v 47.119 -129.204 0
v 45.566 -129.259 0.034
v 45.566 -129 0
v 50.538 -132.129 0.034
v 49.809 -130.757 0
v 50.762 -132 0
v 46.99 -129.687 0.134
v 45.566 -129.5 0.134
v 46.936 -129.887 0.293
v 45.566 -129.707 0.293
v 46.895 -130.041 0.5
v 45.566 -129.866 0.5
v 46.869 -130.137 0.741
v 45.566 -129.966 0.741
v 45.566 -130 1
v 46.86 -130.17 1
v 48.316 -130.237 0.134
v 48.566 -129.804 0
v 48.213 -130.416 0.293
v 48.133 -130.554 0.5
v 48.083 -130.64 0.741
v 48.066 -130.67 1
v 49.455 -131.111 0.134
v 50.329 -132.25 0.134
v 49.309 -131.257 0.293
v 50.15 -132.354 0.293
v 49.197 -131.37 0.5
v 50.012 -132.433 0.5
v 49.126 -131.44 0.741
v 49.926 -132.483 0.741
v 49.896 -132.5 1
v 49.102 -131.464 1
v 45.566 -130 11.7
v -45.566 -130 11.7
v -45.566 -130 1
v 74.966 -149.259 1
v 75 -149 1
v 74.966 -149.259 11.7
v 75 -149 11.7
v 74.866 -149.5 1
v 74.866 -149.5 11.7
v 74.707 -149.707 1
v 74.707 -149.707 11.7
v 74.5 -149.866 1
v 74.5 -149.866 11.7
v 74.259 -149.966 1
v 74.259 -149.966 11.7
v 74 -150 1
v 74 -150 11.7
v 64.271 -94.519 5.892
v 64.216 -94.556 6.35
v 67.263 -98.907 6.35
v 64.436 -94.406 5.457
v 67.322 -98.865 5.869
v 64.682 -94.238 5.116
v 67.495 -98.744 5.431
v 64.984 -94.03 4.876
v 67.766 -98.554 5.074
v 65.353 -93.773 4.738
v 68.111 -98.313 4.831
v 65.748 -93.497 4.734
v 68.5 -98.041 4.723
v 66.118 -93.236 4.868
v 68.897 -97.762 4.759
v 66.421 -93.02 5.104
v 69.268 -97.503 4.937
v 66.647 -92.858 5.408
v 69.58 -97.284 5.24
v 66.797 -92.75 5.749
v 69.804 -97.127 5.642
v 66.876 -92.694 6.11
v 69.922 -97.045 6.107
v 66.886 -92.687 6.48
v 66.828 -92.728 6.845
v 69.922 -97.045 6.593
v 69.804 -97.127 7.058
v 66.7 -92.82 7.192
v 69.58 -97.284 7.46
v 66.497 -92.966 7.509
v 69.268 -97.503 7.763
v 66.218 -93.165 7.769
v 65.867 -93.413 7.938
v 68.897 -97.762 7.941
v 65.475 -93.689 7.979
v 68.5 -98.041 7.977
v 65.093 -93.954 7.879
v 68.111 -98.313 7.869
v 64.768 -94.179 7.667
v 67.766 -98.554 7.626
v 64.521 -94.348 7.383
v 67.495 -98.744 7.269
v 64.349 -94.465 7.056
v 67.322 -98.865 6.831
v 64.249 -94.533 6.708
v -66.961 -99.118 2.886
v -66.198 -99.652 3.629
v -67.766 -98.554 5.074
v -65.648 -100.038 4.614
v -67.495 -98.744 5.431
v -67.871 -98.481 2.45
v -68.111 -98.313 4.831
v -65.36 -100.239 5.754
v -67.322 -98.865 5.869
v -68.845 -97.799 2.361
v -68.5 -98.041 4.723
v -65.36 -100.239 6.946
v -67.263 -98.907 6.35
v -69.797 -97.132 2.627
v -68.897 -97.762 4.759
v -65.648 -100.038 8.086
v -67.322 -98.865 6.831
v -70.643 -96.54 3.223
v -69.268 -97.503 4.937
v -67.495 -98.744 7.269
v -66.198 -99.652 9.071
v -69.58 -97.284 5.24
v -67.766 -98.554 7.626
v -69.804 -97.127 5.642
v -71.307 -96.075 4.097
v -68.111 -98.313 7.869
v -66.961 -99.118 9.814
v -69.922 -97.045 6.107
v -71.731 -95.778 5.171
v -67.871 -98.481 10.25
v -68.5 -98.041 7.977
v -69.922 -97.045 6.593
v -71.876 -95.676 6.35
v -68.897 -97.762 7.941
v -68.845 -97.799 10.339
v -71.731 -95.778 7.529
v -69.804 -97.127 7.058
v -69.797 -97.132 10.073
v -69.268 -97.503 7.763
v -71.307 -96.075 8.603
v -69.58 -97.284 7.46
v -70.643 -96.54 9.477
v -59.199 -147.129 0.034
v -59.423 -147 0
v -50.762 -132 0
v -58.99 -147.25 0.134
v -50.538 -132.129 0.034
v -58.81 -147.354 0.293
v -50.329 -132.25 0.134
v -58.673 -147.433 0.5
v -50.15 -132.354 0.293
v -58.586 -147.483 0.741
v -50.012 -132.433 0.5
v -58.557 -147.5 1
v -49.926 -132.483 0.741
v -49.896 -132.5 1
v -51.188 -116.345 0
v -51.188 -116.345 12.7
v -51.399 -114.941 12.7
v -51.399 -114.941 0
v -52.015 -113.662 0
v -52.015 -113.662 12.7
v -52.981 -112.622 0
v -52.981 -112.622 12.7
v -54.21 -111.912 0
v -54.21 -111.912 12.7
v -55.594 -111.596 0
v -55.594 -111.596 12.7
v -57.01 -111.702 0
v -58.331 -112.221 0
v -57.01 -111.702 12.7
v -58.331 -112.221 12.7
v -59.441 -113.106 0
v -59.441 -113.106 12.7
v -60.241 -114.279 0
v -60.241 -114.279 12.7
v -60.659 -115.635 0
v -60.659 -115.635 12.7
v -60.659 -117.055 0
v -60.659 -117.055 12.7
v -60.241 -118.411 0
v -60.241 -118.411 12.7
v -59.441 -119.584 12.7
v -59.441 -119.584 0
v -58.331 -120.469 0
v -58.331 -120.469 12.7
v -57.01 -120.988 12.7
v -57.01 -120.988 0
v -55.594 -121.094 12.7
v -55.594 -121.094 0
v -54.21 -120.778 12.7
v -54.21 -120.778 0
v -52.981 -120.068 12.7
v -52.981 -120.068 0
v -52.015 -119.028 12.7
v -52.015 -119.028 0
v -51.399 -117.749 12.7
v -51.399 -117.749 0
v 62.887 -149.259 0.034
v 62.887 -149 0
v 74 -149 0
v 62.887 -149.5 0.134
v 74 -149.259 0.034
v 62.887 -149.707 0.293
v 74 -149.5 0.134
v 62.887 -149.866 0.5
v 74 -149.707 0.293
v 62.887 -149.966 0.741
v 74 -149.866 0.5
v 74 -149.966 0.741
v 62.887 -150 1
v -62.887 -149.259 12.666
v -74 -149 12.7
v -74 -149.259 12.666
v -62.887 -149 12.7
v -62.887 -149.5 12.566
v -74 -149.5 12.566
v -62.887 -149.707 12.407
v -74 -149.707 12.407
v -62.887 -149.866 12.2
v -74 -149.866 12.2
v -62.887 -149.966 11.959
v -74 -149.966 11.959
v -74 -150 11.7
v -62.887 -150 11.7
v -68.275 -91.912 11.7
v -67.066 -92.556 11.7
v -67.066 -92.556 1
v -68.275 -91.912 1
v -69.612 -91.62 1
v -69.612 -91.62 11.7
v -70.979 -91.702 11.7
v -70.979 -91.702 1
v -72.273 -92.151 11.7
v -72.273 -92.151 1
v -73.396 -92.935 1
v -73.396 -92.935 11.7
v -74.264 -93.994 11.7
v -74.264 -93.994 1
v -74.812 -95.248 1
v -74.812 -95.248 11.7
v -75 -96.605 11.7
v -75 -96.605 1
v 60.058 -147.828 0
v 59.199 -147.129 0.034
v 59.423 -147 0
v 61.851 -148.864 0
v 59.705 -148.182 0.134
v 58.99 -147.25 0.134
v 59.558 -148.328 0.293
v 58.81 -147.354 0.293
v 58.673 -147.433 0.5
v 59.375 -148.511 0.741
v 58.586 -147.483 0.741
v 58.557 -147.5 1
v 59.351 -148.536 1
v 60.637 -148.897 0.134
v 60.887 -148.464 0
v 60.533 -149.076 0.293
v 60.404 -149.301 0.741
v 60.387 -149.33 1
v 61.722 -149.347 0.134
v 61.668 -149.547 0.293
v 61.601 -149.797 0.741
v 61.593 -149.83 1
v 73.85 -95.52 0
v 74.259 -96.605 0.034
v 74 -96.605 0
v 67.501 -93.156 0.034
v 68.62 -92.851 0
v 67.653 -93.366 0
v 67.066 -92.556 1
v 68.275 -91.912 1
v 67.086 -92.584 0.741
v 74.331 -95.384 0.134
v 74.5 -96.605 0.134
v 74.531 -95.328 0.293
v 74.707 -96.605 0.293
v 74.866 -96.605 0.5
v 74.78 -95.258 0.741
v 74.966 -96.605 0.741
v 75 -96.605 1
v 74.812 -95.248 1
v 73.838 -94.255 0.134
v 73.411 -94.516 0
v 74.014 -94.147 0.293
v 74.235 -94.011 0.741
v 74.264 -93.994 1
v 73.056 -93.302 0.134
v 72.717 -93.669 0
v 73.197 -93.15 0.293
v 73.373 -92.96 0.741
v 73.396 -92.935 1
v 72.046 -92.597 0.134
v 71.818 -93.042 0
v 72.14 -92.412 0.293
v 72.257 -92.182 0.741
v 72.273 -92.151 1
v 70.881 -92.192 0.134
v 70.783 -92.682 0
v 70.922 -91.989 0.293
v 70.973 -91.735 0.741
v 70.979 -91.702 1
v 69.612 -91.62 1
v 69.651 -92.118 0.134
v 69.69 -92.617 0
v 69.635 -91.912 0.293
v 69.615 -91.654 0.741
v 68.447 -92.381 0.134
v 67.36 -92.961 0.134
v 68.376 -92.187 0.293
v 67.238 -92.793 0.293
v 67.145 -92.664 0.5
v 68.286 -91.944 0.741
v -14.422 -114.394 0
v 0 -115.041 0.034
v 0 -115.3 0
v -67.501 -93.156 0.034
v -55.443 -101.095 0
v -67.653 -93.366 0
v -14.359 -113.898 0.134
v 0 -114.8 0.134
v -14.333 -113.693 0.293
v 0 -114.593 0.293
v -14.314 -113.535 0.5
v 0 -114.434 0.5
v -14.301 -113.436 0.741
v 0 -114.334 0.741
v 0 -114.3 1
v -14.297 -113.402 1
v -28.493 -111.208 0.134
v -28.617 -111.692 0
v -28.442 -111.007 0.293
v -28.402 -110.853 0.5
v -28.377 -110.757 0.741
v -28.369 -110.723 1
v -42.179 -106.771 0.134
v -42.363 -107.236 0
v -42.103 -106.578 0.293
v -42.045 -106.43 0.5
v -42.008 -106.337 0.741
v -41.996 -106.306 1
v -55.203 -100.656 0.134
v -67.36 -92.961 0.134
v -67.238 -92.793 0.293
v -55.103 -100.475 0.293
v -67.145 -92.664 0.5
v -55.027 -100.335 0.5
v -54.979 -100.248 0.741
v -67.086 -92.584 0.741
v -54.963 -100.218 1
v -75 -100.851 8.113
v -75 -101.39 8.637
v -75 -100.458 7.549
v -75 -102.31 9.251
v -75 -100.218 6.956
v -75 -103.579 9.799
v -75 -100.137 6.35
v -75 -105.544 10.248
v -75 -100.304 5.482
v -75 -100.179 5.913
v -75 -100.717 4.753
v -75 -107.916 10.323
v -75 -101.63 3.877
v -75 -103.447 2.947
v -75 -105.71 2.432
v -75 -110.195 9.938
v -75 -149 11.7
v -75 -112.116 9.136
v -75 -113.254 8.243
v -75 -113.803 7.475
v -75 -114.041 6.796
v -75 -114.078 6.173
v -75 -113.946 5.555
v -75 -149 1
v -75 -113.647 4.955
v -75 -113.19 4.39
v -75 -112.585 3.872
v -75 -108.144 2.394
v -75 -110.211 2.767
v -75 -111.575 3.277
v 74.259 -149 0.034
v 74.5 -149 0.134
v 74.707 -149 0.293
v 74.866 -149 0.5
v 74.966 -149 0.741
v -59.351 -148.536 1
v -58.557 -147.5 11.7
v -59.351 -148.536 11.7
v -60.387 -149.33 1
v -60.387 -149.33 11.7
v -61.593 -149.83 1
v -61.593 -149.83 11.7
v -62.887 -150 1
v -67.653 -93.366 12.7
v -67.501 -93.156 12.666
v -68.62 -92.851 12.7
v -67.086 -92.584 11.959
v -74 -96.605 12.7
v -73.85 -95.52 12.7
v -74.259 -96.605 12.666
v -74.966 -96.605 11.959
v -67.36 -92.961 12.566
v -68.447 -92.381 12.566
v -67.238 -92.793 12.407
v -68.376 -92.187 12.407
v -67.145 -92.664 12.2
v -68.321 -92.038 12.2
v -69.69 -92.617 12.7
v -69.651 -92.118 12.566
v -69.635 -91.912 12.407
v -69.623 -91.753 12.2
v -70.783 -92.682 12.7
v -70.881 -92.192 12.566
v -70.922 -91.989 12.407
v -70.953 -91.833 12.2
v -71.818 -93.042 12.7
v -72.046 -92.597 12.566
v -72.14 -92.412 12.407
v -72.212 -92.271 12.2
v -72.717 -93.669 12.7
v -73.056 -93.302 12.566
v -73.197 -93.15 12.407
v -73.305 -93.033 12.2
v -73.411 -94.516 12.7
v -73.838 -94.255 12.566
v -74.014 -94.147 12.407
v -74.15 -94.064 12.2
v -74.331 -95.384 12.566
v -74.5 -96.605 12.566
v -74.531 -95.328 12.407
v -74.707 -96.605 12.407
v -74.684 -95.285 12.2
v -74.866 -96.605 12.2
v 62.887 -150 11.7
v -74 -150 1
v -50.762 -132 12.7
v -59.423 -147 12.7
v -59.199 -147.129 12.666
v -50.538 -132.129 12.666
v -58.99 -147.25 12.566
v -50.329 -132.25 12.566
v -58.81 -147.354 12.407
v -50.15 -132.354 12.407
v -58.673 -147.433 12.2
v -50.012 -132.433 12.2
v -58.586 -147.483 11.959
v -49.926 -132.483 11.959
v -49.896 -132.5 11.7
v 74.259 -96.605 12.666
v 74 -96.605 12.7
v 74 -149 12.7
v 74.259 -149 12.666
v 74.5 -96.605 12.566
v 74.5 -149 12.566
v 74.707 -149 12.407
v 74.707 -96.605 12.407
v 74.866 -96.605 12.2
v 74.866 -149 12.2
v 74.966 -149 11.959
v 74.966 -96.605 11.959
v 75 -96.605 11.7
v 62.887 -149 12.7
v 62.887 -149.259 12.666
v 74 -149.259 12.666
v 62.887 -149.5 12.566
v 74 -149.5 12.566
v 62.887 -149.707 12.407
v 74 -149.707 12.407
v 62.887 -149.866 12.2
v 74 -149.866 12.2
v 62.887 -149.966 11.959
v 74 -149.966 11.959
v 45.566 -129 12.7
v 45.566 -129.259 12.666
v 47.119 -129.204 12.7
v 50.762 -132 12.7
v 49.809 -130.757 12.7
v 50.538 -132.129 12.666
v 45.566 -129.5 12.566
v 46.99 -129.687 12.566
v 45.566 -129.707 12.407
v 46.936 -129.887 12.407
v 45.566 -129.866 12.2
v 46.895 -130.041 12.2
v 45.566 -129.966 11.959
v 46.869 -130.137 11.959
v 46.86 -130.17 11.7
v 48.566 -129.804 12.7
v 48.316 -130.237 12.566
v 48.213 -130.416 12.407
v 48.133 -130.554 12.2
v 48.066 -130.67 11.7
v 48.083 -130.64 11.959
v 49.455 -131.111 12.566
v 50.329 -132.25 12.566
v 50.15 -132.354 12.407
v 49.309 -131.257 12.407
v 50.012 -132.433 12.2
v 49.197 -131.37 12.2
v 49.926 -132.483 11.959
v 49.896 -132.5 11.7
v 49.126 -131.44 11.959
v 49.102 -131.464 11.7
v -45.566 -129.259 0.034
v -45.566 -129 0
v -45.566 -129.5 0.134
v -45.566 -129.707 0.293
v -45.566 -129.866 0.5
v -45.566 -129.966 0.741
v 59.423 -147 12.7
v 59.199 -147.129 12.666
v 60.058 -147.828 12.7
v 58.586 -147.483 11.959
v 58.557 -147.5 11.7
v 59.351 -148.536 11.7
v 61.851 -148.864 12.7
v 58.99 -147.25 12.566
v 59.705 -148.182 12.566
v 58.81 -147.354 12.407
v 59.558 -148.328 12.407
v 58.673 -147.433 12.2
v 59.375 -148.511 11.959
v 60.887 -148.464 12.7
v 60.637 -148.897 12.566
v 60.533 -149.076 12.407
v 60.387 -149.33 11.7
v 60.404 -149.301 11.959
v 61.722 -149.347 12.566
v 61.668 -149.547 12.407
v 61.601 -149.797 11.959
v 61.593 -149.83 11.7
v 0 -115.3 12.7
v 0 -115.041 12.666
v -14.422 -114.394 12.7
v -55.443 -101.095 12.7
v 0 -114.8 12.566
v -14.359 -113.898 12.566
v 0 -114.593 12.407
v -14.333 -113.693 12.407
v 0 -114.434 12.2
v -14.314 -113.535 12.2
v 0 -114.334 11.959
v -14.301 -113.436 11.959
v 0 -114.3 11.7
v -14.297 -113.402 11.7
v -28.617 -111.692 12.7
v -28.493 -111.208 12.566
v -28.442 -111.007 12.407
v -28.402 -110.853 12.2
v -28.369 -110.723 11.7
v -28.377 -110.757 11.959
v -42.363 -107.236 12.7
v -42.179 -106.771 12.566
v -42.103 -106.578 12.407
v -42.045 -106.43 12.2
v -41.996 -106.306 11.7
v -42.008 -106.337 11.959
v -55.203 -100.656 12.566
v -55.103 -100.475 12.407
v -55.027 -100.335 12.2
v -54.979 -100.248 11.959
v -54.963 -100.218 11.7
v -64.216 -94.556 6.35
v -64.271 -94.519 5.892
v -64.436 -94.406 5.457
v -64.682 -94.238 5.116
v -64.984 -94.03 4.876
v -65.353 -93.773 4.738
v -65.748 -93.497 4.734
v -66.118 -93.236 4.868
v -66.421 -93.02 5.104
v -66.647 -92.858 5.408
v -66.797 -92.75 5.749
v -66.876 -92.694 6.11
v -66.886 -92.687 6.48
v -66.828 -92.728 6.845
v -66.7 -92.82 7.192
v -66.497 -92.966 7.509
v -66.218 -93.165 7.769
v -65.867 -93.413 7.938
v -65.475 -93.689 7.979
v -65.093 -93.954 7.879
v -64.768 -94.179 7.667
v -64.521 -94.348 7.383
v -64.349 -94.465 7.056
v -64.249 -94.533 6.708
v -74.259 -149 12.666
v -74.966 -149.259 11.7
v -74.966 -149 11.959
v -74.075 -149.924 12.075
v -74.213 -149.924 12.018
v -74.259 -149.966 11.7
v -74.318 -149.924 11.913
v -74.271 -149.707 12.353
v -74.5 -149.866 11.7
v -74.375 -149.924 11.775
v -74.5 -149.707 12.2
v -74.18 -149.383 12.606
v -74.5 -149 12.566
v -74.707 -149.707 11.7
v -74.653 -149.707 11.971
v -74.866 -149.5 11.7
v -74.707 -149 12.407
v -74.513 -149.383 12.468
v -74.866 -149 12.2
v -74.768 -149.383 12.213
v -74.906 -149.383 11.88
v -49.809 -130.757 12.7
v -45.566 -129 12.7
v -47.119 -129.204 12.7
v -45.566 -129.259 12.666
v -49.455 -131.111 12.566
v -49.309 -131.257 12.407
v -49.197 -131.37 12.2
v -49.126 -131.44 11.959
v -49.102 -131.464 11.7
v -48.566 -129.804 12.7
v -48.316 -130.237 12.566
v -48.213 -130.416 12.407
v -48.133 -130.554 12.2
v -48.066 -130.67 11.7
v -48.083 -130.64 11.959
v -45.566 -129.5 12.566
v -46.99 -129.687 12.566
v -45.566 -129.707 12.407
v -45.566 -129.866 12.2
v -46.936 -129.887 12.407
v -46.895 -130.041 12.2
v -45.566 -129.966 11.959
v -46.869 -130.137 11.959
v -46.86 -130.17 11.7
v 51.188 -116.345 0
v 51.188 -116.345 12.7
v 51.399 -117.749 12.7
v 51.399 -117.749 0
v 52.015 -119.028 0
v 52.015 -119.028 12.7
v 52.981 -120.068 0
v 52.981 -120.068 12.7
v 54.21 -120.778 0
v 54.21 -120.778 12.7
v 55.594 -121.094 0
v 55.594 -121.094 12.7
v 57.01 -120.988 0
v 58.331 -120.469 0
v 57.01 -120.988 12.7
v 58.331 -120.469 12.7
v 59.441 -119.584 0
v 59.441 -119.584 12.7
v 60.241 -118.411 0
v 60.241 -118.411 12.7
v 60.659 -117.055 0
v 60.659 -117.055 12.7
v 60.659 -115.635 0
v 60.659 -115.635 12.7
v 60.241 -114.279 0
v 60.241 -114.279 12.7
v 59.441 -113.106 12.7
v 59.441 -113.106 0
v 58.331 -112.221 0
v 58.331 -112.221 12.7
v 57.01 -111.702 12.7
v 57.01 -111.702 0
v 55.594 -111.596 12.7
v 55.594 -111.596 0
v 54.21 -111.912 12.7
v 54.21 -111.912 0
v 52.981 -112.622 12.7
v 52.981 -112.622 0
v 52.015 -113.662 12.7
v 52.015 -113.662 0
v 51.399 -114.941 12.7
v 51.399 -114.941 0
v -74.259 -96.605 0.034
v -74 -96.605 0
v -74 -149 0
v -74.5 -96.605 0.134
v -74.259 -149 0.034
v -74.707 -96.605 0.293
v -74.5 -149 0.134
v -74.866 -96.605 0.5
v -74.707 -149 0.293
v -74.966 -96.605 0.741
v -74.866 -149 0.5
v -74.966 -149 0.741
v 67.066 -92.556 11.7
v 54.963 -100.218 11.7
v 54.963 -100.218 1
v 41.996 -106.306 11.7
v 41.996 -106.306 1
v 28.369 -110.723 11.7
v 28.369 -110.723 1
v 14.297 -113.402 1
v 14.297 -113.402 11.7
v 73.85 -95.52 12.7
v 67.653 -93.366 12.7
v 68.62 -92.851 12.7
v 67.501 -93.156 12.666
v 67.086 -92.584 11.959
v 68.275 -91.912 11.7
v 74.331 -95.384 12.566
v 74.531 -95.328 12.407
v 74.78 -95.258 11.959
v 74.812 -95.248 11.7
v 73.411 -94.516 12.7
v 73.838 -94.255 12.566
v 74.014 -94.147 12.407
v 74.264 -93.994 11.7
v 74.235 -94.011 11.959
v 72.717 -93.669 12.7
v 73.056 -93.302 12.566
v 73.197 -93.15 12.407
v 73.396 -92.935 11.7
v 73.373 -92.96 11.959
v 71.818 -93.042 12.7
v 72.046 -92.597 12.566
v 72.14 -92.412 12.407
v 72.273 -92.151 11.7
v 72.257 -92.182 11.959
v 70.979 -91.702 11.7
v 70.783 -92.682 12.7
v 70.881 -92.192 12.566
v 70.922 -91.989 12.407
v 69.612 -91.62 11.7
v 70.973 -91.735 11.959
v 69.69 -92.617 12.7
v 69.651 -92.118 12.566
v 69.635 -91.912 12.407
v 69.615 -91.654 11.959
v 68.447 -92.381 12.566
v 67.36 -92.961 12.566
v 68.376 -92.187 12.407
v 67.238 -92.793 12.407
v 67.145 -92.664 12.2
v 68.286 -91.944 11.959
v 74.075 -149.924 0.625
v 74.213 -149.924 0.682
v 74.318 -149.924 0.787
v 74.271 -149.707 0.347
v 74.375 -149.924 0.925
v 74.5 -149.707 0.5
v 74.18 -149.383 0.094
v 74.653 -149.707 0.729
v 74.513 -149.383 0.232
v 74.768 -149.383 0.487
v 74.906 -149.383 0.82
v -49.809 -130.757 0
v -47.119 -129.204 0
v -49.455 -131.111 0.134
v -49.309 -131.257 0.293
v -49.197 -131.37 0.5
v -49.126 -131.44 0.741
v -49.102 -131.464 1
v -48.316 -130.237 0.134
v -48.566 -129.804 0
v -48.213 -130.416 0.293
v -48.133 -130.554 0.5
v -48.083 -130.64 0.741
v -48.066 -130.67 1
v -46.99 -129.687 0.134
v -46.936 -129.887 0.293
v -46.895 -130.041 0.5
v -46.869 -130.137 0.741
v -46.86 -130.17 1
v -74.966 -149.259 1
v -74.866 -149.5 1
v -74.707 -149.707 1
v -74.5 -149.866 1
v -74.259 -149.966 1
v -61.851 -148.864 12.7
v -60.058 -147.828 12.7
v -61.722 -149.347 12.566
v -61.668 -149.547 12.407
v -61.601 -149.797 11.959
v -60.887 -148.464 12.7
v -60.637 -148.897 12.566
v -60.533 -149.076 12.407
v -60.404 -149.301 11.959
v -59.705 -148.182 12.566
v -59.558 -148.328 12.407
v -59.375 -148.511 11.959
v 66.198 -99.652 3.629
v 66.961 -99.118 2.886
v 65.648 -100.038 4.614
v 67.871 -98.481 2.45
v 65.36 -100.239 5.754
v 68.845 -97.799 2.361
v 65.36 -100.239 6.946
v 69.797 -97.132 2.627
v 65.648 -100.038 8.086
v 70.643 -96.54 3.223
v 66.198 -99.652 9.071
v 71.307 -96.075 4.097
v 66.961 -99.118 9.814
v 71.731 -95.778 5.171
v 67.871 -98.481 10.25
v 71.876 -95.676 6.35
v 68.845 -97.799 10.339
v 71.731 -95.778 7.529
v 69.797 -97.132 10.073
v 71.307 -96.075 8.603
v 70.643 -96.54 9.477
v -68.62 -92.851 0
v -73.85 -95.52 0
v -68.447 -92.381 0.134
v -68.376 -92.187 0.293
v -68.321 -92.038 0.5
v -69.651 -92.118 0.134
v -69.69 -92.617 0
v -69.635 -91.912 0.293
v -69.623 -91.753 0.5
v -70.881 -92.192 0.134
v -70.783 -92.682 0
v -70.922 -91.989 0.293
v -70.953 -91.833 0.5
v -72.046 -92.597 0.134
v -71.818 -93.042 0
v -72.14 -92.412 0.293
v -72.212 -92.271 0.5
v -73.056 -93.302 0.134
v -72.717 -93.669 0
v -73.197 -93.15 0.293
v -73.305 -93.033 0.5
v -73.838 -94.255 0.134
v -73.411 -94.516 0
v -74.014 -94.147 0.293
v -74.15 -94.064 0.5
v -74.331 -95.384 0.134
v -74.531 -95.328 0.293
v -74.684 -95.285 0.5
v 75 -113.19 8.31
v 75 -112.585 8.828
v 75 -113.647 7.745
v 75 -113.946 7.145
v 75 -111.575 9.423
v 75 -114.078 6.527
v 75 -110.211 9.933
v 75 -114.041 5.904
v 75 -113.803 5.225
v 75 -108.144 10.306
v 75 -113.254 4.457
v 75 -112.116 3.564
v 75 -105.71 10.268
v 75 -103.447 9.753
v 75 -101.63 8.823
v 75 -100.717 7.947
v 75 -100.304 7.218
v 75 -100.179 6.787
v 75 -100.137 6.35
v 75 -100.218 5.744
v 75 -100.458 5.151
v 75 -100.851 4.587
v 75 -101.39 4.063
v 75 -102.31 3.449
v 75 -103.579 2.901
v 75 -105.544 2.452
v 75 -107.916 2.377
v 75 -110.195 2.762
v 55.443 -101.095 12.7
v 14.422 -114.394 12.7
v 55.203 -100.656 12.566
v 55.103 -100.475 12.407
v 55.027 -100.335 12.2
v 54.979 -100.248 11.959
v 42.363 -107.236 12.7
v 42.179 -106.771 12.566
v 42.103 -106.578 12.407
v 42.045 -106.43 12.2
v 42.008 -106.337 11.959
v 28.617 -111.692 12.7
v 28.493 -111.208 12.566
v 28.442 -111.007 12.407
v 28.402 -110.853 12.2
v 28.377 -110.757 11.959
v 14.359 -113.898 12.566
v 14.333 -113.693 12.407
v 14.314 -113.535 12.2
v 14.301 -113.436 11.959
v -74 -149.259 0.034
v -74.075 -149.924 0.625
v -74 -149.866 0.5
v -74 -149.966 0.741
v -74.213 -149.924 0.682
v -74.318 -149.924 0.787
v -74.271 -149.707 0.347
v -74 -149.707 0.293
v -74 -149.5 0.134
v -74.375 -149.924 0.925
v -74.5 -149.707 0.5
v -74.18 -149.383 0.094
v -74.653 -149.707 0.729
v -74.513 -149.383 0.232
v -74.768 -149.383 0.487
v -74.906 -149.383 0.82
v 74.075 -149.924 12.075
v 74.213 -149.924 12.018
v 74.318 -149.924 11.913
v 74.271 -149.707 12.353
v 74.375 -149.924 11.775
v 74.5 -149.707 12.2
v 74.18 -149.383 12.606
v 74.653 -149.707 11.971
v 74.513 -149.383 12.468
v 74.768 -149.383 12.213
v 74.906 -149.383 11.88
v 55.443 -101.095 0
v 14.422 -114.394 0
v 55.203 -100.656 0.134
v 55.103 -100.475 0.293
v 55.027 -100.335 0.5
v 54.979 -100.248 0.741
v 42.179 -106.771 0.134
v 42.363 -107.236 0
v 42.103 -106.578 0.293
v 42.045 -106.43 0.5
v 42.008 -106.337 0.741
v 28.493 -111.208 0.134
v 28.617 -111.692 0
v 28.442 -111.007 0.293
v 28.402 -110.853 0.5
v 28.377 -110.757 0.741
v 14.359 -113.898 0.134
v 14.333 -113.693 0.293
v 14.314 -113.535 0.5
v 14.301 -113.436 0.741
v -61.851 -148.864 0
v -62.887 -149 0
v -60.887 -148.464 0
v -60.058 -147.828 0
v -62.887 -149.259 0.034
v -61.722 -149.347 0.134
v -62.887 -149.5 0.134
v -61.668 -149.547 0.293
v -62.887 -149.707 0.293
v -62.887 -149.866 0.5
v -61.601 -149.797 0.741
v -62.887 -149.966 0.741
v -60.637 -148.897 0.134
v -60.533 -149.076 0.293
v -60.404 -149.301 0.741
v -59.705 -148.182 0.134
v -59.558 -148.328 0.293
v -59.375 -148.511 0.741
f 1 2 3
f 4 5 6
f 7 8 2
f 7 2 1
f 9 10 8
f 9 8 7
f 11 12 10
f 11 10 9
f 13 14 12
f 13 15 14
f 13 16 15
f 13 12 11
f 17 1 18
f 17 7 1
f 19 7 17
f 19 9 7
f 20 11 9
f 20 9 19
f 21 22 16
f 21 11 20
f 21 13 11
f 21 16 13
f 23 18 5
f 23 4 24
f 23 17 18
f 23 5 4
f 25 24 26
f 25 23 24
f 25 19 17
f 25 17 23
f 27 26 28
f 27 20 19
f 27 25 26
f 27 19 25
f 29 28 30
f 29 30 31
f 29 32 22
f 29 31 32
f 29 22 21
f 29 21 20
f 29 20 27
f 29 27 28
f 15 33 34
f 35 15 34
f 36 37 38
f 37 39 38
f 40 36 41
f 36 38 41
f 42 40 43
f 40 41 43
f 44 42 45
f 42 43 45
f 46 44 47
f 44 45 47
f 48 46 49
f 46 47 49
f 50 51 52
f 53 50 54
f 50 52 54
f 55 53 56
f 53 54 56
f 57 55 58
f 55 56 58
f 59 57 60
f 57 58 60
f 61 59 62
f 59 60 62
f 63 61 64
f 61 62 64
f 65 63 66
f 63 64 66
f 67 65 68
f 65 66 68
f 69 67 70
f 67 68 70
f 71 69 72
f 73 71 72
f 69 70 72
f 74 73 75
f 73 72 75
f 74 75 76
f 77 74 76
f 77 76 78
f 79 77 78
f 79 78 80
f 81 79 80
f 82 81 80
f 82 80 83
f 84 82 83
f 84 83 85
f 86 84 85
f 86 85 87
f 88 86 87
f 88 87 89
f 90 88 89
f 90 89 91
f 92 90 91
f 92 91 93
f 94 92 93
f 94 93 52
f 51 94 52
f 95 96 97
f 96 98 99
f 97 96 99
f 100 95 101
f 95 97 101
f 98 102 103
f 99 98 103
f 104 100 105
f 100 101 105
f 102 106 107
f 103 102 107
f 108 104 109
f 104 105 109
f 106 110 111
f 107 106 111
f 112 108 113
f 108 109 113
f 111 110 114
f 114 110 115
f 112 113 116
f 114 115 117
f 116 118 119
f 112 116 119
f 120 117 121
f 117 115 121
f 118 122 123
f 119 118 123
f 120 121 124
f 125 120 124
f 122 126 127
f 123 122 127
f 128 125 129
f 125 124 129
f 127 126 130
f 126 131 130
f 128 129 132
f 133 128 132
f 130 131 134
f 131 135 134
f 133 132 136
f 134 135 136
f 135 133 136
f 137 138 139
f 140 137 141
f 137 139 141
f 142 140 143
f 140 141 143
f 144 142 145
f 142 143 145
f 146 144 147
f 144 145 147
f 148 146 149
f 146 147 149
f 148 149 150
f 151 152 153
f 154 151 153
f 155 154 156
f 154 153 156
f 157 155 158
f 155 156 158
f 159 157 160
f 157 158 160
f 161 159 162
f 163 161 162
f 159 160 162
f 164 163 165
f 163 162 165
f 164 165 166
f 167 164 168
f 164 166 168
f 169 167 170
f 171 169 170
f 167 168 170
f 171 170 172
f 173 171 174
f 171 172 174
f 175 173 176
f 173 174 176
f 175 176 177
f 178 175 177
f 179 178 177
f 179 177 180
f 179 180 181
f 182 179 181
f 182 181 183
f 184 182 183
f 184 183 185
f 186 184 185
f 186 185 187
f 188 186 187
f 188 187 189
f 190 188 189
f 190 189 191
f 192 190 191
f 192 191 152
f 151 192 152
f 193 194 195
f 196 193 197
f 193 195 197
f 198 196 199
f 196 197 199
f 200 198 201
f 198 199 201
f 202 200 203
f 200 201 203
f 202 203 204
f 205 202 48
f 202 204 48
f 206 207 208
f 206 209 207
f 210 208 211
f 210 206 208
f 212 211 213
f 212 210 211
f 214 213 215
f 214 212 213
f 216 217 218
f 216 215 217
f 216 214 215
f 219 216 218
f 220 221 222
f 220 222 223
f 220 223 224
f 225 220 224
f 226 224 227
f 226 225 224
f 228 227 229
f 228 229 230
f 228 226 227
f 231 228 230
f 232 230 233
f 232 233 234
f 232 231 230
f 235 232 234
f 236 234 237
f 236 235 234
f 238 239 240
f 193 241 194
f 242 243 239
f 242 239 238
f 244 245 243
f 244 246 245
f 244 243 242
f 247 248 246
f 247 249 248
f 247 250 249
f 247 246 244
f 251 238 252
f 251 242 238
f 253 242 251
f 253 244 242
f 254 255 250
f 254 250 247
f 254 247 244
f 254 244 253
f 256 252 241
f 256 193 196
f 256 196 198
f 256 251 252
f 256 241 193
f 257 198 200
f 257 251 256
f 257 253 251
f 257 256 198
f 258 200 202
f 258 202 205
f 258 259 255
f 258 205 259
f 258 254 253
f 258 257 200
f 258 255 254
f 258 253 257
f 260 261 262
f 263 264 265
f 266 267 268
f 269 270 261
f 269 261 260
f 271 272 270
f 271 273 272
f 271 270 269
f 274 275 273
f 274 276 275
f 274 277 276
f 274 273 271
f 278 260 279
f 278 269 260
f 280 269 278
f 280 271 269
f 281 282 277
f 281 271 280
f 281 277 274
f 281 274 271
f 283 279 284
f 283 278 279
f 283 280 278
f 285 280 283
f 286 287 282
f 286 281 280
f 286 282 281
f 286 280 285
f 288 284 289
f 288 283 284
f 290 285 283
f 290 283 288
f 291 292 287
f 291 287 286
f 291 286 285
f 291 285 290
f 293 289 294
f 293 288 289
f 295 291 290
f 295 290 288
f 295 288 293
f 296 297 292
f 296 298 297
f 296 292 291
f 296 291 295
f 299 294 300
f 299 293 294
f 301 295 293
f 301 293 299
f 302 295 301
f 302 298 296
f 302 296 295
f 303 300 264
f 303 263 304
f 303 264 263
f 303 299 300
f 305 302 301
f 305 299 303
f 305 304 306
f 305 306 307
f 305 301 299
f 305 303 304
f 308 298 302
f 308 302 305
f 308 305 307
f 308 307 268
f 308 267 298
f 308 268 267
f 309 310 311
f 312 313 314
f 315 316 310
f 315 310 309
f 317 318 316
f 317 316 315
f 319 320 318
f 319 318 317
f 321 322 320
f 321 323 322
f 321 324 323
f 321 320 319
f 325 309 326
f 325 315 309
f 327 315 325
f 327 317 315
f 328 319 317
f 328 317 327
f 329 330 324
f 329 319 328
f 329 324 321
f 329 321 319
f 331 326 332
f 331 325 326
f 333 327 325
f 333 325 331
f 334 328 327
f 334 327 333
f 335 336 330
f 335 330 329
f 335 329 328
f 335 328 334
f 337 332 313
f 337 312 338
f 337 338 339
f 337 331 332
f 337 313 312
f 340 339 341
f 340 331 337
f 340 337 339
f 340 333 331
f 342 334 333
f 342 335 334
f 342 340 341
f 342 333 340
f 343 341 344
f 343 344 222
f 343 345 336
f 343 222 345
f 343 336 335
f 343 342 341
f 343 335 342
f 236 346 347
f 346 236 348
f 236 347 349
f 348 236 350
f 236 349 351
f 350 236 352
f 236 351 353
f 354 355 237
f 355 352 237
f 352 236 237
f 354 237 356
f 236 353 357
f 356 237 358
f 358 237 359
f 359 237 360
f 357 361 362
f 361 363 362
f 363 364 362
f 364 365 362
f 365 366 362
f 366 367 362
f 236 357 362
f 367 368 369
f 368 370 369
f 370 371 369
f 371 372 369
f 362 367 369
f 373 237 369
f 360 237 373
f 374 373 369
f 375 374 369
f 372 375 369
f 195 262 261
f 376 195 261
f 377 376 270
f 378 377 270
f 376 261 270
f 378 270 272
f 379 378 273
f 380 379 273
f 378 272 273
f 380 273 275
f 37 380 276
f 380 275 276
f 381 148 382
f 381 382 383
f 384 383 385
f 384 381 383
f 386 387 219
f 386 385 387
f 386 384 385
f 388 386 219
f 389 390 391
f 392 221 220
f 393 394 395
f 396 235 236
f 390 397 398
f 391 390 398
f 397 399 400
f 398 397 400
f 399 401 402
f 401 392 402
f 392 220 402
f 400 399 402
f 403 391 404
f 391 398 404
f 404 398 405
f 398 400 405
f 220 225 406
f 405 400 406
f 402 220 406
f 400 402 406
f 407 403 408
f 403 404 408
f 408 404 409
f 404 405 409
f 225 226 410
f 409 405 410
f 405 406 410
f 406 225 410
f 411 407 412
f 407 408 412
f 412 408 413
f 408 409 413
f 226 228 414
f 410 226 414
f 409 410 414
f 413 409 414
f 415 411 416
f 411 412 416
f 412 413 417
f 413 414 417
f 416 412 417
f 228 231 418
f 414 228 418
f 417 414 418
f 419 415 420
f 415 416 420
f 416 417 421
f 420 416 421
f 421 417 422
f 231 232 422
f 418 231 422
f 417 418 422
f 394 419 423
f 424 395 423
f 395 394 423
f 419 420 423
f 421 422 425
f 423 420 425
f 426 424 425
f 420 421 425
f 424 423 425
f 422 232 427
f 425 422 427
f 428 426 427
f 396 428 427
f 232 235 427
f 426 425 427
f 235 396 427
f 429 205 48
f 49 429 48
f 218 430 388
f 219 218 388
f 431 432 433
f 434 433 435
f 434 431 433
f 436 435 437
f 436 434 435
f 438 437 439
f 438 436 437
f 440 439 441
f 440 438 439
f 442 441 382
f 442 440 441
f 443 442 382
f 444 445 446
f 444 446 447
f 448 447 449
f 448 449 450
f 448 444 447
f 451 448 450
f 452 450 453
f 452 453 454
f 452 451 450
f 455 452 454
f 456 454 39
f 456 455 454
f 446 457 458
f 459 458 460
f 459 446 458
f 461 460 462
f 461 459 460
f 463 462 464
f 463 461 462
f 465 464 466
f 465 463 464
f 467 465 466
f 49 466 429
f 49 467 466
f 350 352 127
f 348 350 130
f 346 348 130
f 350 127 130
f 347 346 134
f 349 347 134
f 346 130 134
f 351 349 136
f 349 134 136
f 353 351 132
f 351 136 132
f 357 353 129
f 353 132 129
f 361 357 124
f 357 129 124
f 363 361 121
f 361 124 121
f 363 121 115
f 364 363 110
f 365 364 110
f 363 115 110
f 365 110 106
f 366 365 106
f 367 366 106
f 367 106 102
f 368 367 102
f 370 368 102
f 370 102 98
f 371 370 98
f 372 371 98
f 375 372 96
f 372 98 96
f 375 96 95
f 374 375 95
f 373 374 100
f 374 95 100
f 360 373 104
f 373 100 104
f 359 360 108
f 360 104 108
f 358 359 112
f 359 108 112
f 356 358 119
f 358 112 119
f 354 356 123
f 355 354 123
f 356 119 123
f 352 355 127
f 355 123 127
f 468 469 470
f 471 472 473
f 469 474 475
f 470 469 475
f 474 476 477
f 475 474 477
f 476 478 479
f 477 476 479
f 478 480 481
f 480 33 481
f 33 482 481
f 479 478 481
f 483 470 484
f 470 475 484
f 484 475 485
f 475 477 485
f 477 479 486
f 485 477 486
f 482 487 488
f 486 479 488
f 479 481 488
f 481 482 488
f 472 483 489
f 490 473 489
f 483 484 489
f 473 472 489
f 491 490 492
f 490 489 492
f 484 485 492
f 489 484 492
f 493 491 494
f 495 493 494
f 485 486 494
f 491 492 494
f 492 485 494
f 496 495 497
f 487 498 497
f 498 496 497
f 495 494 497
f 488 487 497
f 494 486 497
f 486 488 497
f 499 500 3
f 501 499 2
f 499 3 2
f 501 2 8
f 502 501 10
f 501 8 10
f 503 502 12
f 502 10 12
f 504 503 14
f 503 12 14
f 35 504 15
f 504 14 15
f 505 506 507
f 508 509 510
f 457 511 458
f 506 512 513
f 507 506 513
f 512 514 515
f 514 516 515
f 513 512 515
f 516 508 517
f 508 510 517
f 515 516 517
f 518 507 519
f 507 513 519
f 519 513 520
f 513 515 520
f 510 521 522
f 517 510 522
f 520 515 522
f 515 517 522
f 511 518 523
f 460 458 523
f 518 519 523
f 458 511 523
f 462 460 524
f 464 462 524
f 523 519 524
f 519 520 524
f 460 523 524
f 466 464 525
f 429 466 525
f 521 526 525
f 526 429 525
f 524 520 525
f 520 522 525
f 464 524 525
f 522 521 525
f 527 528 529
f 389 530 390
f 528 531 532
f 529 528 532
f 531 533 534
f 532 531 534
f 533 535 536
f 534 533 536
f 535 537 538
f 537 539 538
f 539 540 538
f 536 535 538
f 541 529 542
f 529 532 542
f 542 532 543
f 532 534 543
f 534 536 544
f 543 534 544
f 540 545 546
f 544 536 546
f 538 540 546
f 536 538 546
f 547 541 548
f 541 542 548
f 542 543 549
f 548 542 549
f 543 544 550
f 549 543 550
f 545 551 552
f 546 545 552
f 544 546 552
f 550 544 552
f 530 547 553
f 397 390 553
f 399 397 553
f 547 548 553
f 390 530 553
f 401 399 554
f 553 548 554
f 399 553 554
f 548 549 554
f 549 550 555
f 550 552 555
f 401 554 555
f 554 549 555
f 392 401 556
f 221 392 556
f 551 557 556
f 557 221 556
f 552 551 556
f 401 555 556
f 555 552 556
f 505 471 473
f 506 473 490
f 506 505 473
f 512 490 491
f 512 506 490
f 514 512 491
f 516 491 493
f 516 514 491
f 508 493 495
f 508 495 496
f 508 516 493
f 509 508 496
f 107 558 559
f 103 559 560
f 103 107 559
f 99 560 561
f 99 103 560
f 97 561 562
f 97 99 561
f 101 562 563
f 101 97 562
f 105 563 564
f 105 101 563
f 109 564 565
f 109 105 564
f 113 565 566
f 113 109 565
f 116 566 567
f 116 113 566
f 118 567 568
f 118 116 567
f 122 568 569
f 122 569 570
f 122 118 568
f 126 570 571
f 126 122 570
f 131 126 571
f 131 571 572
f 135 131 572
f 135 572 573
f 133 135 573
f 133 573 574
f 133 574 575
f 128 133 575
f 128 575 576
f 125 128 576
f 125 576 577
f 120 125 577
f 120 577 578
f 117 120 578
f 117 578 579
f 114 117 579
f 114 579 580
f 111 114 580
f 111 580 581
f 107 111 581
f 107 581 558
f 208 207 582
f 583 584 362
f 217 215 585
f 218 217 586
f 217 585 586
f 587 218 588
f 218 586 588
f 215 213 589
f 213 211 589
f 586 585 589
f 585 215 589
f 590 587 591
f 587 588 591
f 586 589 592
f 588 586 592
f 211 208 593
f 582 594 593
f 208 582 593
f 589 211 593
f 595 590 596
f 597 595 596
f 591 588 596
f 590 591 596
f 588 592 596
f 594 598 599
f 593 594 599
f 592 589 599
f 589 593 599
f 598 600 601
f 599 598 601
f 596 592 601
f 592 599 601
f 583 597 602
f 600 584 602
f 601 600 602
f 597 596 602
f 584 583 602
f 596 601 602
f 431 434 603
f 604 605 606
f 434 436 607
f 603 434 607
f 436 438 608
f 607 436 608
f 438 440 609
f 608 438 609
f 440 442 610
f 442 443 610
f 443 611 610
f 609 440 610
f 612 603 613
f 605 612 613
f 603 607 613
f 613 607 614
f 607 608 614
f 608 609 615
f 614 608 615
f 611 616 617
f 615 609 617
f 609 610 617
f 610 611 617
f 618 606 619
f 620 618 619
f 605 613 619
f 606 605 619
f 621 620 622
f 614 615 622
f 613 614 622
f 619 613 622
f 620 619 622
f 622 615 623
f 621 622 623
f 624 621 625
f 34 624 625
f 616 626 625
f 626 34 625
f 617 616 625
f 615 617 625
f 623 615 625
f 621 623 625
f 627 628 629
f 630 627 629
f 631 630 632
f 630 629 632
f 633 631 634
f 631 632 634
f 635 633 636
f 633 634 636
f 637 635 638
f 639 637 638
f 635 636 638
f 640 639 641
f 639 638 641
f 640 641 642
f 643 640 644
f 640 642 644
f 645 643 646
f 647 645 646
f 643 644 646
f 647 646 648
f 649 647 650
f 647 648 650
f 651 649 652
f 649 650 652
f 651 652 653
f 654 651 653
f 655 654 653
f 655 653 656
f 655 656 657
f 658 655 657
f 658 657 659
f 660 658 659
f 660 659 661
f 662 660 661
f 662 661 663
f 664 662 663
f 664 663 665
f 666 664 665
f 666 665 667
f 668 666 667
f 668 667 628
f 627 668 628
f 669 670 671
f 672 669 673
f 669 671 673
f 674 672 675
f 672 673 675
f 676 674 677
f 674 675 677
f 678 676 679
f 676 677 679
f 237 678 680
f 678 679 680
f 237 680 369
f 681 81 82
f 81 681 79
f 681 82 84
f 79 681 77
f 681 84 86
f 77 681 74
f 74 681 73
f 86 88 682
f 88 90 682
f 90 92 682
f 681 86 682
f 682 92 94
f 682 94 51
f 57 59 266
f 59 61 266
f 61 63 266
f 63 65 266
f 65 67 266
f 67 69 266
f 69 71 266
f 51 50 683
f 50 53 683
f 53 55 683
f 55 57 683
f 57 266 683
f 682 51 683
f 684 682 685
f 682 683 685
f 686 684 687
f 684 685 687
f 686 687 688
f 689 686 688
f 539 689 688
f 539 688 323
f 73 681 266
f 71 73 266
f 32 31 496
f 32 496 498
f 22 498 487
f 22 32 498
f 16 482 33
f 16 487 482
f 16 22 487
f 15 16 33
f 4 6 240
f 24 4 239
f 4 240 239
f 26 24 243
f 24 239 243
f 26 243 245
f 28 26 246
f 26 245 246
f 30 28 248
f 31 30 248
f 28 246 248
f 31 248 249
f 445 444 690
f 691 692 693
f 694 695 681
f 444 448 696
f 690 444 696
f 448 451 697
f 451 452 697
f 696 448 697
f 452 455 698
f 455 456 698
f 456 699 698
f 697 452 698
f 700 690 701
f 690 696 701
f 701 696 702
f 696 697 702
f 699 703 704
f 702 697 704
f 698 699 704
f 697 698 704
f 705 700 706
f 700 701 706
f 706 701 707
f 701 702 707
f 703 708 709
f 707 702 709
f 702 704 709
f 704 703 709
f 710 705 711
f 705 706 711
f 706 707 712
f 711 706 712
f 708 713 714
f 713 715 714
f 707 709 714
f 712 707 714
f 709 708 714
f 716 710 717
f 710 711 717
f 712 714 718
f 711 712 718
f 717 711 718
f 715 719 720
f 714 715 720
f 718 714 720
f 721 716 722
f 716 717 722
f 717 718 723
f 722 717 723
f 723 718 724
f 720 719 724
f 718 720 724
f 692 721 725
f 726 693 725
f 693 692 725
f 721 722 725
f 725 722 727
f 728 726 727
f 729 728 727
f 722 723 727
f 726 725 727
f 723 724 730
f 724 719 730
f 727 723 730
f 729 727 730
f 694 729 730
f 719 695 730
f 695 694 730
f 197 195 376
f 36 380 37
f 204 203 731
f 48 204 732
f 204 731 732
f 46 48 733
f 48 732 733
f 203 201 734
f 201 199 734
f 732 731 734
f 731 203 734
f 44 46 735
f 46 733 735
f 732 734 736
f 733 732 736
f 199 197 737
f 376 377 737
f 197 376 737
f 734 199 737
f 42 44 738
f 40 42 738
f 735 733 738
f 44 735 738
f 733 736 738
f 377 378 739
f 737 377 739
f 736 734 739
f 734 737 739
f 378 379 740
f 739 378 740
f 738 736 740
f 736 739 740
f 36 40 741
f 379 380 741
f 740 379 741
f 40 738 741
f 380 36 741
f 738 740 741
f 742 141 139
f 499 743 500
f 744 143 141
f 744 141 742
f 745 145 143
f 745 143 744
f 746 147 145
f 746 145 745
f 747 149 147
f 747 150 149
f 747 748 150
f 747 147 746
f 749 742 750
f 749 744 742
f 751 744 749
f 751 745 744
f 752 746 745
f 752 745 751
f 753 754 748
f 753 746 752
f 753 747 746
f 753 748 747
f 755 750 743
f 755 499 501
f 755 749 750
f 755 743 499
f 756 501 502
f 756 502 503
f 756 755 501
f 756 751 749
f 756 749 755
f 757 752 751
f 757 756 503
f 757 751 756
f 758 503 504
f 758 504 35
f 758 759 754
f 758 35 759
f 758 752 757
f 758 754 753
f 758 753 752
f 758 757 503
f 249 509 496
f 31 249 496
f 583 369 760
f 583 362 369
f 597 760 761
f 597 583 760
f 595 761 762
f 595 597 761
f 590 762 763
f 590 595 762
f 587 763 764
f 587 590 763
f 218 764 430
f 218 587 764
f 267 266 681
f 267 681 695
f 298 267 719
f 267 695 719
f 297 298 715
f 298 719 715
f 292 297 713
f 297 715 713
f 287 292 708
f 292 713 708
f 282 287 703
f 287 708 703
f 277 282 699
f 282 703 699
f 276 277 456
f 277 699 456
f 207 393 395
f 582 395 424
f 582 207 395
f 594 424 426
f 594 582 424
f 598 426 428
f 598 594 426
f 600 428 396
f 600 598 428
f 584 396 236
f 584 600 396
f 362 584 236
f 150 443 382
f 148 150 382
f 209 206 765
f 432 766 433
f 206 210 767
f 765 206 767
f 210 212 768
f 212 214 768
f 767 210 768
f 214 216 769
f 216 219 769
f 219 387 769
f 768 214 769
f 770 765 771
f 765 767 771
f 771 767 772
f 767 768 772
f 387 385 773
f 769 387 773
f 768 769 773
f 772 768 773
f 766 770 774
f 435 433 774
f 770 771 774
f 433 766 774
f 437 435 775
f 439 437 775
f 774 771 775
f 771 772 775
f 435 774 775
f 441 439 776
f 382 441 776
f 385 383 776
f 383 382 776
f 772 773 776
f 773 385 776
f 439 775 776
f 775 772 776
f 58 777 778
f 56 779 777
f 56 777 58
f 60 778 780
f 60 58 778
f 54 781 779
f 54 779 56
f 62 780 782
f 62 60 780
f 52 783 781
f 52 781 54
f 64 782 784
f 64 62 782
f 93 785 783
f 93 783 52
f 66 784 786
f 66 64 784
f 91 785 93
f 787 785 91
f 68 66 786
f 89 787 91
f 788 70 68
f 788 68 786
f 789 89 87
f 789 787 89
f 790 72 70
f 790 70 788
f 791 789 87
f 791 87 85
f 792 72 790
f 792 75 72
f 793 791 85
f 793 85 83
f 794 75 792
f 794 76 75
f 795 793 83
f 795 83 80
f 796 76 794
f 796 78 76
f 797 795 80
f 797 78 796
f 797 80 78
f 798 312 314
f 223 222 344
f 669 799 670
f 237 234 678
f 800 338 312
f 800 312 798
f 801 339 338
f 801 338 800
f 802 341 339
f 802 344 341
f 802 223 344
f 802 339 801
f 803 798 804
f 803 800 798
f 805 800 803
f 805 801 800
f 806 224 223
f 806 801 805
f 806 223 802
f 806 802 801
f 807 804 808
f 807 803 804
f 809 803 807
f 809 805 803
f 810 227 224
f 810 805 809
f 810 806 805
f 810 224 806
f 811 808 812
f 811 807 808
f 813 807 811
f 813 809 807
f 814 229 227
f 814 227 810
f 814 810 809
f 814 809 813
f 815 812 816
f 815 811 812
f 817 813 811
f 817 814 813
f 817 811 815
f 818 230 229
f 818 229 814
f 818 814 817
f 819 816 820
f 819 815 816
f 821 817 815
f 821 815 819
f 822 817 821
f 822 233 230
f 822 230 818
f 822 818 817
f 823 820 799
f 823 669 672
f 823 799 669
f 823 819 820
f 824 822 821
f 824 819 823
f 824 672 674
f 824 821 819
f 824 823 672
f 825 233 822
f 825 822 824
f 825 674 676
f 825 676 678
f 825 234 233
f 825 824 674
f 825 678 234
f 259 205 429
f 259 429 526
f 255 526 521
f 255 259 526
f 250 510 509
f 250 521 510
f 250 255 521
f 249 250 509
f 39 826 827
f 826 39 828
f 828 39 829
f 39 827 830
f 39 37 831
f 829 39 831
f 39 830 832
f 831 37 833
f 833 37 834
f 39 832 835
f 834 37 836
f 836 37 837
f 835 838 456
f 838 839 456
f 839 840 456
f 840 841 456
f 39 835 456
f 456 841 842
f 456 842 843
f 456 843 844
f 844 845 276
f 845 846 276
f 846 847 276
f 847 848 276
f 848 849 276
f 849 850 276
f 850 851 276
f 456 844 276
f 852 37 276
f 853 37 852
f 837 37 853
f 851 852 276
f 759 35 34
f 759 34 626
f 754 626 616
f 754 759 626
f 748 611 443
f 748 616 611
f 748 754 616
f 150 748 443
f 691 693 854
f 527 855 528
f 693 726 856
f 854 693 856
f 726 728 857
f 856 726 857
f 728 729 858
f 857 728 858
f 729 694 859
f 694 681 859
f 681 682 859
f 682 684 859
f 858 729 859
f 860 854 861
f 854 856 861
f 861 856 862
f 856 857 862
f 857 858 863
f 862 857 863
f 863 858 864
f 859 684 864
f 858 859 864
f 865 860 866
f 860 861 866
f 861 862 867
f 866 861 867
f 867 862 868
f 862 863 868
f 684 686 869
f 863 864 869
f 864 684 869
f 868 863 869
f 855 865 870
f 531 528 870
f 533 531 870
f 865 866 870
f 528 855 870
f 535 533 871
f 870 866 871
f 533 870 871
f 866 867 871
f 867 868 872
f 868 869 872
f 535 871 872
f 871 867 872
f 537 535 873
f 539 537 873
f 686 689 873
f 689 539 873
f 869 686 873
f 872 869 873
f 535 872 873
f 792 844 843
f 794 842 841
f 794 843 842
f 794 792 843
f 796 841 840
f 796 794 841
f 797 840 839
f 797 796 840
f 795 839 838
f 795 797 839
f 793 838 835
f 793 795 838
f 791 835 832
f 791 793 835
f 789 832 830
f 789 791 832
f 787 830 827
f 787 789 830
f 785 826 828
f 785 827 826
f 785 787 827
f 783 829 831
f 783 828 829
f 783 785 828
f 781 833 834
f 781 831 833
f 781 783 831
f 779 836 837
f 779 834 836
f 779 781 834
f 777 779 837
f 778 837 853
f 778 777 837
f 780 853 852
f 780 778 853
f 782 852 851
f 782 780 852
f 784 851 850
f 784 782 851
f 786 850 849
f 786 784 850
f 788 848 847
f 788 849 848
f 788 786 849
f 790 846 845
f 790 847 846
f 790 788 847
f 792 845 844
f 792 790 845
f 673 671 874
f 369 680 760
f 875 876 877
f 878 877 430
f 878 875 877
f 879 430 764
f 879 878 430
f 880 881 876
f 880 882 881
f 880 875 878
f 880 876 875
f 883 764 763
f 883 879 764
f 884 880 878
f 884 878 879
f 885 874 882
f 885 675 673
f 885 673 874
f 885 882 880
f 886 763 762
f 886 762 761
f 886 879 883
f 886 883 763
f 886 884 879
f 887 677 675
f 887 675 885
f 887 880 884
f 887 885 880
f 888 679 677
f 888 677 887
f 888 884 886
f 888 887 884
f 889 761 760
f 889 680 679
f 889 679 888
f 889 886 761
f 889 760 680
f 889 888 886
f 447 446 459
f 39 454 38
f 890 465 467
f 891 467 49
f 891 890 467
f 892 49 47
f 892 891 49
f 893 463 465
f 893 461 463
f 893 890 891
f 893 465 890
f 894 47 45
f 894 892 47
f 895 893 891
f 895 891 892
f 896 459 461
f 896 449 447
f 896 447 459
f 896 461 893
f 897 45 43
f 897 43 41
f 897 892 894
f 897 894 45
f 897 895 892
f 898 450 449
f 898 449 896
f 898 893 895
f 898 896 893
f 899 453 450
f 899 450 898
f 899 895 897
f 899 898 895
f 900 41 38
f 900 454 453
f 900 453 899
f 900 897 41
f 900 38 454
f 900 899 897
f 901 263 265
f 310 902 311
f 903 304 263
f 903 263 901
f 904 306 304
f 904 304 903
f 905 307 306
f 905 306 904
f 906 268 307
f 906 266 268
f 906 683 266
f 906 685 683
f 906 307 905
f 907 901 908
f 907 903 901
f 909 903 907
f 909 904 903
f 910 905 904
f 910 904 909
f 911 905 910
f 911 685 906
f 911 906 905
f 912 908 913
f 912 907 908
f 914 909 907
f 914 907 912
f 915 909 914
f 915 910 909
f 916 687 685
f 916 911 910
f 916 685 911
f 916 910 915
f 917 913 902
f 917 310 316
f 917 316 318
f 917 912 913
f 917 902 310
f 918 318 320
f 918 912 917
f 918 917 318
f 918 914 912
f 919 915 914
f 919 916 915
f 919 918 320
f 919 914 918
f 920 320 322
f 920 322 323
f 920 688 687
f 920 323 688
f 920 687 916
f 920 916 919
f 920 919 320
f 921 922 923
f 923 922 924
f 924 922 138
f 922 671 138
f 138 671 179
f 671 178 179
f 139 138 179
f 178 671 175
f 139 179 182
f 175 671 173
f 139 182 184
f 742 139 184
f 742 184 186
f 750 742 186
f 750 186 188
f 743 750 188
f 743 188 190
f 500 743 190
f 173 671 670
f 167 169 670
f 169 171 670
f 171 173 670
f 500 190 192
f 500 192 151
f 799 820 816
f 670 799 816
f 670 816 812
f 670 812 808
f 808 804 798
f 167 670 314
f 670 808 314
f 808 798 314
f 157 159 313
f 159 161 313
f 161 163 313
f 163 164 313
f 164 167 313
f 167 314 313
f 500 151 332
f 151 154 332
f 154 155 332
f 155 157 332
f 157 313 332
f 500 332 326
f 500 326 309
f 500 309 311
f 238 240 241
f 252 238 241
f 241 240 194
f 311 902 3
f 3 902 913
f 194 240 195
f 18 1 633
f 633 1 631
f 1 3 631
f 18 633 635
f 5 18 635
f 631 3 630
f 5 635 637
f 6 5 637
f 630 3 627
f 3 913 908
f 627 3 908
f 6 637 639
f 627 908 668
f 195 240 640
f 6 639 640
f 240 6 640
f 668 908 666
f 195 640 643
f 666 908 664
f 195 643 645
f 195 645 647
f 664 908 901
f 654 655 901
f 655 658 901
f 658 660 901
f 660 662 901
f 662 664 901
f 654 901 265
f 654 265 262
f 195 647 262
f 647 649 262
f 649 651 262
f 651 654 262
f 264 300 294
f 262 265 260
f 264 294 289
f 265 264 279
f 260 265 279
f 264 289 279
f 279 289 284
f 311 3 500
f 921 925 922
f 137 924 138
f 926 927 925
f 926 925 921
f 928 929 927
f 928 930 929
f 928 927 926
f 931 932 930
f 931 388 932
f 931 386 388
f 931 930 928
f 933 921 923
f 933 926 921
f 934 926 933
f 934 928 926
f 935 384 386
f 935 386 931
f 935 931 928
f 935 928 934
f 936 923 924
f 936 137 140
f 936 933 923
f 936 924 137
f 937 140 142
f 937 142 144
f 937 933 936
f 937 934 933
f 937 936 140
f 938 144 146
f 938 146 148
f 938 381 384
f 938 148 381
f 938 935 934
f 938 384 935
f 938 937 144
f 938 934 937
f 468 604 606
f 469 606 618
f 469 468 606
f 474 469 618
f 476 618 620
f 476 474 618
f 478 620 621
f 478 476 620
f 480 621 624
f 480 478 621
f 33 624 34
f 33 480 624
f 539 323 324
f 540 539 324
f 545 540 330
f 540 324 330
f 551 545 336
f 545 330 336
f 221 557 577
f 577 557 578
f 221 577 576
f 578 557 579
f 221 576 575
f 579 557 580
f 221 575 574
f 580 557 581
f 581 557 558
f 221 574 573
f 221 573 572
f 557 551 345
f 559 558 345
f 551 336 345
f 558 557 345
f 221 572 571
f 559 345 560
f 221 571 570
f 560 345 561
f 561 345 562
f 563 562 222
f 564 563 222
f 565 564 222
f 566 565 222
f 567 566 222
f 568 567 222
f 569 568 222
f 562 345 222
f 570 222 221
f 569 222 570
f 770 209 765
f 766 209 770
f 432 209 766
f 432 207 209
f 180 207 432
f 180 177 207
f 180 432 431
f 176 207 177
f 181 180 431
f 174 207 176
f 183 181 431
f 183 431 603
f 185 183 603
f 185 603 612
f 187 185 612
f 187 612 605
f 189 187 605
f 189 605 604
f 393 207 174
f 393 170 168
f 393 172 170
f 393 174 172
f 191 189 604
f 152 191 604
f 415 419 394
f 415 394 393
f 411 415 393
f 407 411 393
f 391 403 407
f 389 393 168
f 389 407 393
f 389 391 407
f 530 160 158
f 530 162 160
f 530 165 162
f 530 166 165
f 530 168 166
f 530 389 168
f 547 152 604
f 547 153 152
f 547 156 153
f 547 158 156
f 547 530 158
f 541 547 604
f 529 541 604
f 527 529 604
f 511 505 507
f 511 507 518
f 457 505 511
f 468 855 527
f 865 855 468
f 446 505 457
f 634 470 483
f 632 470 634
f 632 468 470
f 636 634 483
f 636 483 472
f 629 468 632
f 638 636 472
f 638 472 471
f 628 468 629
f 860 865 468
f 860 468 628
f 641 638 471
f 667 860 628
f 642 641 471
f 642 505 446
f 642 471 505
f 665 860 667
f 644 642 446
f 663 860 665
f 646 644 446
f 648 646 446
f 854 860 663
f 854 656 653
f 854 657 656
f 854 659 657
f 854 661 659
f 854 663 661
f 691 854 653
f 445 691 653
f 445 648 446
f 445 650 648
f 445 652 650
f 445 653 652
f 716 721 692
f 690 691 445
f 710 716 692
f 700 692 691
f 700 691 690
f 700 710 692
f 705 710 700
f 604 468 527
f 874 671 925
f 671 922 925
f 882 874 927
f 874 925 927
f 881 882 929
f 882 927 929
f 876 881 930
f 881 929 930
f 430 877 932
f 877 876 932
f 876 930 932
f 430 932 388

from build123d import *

# Parameters (mm, degrees)
BOSS_EXTRUDE1_DEPTH = 12.7
SKETCH14_R          = 4
CUT_EXTRUDE1_DEPTH  = 12.7
SKETCH14_3_R        = 1.63195
CUT_EXTRUDE2_DEPTH  = 158.035218157
CUT_EXTRUDE3_DEPTH  = 169.185284783
FILLET1_R           = 5
FILLET2_R           = 1
SKETCH16_R          = 4.7625
CUT_EXTRUDE4_DEPTH  = 169.185284738


with BuildPart() as part:
    # Sketch1 → Boss-Extrude1 (new body)
    with BuildSketch(Plane.XY):
        with BuildLine():
            ThreePointArc((75, -86.252478225), (0, -114.3), (-75, -86.252478225))
            Line((-75, -86.252478225), (-75, -150))
            Line((-75, -150), (75, -150))
            Line((75, -150), (75, -86.252478225))
        make_face()
    extrude(amount=BOSS_EXTRUDE1_DEPTH)

    # Sketch14 → Cut-Extrude1 (cut, symmetric)
    with BuildSketch(Plane(origin=(-75.884162529, -108.373815459, 0), x_dir=(-0.8191520442889954, 0.5735764363510409, 0), z_dir=(0.5735764363510409, 0.8191520442889954, 0))):
        with Locations((0, 6.35)):
            Circle(SKETCH14_R)
    cut_extrude1 = extrude(amount=CUT_EXTRUDE1_DEPTH, both=True, mode=Mode.SUBTRACT)

    # Sketch14<3> → Cut-Extrude2 (cut, through all)
    with BuildSketch(Plane(origin=(-75.884162529, -108.373815459, 0), x_dir=(-0.8191520442889954, 0.5735764363510409, 0), z_dir=(0.5735764363510409, 0.8191520442889954, 0))):
        with Locations((0, 6.35)):
            Circle(SKETCH14_3_R)
    cut_extrude2 = extrude(amount=CUT_EXTRUDE2_DEPTH, mode=Mode.SUBTRACT)

    # Mirror1: Cut-Extrude1, Cut-Extrude2 across plane
    add(cut_extrude1.mirror(Plane(origin=(0, 0, 0), x_dir=(0, 0, 1), z_dir=(1, 0, 0))), mode=Mode.SUBTRACT)
    add(cut_extrude2.mirror(Plane(origin=(0, 0, 0), x_dir=(0, 0, 1), z_dir=(1, 0, 0))), mode=Mode.SUBTRACT)

    # Sketch15 → Cut-Extrude3 (cut, through all)
    with BuildSketch(Plane.XY.offset(12.7)):
        Polygon((48.452994616, -130), (-48.452994616, -130), (-60, -150), (60, -150), align=None)
    extrude(amount=-CUT_EXTRUDE3_DEPTH, mode=Mode.SUBTRACT)

    # Fillet1
    fillet1_edges = [part.edges().sort_by_distance(p)[0] for p in [
        (75, -86.252478225, 6.35),
        (60, -150, 6.35),
        (48.452994616, -130, 6.35),
        (-48.452994616, -130, 6.35),
        (-60, -150, 6.35),
        (-75, -86.252478225, 6.35),
    ]]
    fillet(fillet1_edges, radius=FILLET1_R)

    # Fillet2
    fillet2_edges = [part.edges().sort_by_distance(p)[0] for p in [
        (60.386751346, -149.330127019, 0),
        (54.226497308, -140, 0),
        (60.386751346, -149.330127019, 12.7),
        (68.943375673, -150, 0),
        (48.06624327, -130.669872981, 0),
        (54.226497308, -140, 12.7),
        (75, -150, 6.35),
        (68.943375673, -150, 12.7),
        (75, -123.302406772, 0),
        (0, -130, 0),
        (48.06624327, -130.669872981, 12.7),
        (75, -123.302406772, 12.7),
        (72.272784424, -92.151224996, 0),
        (-48.06624327, -130.669872981, 0),
        (0, -130, 12.7),
        (72.272784424, -92.151224996, 12.7),
        (0, -114.3, 0),
        (-54.226497308, -140, 0),
        (-48.06624327, -130.669872981, 12.7),
        (0, -114.3, 12.7),
        (-72.272784424, -92.151224996, 0),
        (-60.386751346, -149.330127019, 0),
        (-54.226497308, -140, 12.7),
        (-72.272784424, -92.151224996, 12.7),
        (-75, -123.302406772, 0),
        (-68.943375673, -150, 0),
        (-60.386751346, -149.330127019, 12.7),
        (-75, -123.302406772, 12.7),
        (-75, -150, 6.35),
        (-68.943375673, -150, 12.7),
    ]]
    fillet(fillet2_edges, radius=FILLET2_R)

    # Sketch16 → Cut-Extrude4 (cut, through all)
    with BuildSketch(Plane.XY.offset(12.7)):
        with Locations((-55.95, -116.345)):
            Circle(SKETCH16_R)
        with Locations((55.95, -116.345)):
            Circle(SKETCH16_R)
    extrude(amount=-CUT_EXTRUDE4_DEPTH, mode=Mode.SUBTRACT)


solid = part.part
